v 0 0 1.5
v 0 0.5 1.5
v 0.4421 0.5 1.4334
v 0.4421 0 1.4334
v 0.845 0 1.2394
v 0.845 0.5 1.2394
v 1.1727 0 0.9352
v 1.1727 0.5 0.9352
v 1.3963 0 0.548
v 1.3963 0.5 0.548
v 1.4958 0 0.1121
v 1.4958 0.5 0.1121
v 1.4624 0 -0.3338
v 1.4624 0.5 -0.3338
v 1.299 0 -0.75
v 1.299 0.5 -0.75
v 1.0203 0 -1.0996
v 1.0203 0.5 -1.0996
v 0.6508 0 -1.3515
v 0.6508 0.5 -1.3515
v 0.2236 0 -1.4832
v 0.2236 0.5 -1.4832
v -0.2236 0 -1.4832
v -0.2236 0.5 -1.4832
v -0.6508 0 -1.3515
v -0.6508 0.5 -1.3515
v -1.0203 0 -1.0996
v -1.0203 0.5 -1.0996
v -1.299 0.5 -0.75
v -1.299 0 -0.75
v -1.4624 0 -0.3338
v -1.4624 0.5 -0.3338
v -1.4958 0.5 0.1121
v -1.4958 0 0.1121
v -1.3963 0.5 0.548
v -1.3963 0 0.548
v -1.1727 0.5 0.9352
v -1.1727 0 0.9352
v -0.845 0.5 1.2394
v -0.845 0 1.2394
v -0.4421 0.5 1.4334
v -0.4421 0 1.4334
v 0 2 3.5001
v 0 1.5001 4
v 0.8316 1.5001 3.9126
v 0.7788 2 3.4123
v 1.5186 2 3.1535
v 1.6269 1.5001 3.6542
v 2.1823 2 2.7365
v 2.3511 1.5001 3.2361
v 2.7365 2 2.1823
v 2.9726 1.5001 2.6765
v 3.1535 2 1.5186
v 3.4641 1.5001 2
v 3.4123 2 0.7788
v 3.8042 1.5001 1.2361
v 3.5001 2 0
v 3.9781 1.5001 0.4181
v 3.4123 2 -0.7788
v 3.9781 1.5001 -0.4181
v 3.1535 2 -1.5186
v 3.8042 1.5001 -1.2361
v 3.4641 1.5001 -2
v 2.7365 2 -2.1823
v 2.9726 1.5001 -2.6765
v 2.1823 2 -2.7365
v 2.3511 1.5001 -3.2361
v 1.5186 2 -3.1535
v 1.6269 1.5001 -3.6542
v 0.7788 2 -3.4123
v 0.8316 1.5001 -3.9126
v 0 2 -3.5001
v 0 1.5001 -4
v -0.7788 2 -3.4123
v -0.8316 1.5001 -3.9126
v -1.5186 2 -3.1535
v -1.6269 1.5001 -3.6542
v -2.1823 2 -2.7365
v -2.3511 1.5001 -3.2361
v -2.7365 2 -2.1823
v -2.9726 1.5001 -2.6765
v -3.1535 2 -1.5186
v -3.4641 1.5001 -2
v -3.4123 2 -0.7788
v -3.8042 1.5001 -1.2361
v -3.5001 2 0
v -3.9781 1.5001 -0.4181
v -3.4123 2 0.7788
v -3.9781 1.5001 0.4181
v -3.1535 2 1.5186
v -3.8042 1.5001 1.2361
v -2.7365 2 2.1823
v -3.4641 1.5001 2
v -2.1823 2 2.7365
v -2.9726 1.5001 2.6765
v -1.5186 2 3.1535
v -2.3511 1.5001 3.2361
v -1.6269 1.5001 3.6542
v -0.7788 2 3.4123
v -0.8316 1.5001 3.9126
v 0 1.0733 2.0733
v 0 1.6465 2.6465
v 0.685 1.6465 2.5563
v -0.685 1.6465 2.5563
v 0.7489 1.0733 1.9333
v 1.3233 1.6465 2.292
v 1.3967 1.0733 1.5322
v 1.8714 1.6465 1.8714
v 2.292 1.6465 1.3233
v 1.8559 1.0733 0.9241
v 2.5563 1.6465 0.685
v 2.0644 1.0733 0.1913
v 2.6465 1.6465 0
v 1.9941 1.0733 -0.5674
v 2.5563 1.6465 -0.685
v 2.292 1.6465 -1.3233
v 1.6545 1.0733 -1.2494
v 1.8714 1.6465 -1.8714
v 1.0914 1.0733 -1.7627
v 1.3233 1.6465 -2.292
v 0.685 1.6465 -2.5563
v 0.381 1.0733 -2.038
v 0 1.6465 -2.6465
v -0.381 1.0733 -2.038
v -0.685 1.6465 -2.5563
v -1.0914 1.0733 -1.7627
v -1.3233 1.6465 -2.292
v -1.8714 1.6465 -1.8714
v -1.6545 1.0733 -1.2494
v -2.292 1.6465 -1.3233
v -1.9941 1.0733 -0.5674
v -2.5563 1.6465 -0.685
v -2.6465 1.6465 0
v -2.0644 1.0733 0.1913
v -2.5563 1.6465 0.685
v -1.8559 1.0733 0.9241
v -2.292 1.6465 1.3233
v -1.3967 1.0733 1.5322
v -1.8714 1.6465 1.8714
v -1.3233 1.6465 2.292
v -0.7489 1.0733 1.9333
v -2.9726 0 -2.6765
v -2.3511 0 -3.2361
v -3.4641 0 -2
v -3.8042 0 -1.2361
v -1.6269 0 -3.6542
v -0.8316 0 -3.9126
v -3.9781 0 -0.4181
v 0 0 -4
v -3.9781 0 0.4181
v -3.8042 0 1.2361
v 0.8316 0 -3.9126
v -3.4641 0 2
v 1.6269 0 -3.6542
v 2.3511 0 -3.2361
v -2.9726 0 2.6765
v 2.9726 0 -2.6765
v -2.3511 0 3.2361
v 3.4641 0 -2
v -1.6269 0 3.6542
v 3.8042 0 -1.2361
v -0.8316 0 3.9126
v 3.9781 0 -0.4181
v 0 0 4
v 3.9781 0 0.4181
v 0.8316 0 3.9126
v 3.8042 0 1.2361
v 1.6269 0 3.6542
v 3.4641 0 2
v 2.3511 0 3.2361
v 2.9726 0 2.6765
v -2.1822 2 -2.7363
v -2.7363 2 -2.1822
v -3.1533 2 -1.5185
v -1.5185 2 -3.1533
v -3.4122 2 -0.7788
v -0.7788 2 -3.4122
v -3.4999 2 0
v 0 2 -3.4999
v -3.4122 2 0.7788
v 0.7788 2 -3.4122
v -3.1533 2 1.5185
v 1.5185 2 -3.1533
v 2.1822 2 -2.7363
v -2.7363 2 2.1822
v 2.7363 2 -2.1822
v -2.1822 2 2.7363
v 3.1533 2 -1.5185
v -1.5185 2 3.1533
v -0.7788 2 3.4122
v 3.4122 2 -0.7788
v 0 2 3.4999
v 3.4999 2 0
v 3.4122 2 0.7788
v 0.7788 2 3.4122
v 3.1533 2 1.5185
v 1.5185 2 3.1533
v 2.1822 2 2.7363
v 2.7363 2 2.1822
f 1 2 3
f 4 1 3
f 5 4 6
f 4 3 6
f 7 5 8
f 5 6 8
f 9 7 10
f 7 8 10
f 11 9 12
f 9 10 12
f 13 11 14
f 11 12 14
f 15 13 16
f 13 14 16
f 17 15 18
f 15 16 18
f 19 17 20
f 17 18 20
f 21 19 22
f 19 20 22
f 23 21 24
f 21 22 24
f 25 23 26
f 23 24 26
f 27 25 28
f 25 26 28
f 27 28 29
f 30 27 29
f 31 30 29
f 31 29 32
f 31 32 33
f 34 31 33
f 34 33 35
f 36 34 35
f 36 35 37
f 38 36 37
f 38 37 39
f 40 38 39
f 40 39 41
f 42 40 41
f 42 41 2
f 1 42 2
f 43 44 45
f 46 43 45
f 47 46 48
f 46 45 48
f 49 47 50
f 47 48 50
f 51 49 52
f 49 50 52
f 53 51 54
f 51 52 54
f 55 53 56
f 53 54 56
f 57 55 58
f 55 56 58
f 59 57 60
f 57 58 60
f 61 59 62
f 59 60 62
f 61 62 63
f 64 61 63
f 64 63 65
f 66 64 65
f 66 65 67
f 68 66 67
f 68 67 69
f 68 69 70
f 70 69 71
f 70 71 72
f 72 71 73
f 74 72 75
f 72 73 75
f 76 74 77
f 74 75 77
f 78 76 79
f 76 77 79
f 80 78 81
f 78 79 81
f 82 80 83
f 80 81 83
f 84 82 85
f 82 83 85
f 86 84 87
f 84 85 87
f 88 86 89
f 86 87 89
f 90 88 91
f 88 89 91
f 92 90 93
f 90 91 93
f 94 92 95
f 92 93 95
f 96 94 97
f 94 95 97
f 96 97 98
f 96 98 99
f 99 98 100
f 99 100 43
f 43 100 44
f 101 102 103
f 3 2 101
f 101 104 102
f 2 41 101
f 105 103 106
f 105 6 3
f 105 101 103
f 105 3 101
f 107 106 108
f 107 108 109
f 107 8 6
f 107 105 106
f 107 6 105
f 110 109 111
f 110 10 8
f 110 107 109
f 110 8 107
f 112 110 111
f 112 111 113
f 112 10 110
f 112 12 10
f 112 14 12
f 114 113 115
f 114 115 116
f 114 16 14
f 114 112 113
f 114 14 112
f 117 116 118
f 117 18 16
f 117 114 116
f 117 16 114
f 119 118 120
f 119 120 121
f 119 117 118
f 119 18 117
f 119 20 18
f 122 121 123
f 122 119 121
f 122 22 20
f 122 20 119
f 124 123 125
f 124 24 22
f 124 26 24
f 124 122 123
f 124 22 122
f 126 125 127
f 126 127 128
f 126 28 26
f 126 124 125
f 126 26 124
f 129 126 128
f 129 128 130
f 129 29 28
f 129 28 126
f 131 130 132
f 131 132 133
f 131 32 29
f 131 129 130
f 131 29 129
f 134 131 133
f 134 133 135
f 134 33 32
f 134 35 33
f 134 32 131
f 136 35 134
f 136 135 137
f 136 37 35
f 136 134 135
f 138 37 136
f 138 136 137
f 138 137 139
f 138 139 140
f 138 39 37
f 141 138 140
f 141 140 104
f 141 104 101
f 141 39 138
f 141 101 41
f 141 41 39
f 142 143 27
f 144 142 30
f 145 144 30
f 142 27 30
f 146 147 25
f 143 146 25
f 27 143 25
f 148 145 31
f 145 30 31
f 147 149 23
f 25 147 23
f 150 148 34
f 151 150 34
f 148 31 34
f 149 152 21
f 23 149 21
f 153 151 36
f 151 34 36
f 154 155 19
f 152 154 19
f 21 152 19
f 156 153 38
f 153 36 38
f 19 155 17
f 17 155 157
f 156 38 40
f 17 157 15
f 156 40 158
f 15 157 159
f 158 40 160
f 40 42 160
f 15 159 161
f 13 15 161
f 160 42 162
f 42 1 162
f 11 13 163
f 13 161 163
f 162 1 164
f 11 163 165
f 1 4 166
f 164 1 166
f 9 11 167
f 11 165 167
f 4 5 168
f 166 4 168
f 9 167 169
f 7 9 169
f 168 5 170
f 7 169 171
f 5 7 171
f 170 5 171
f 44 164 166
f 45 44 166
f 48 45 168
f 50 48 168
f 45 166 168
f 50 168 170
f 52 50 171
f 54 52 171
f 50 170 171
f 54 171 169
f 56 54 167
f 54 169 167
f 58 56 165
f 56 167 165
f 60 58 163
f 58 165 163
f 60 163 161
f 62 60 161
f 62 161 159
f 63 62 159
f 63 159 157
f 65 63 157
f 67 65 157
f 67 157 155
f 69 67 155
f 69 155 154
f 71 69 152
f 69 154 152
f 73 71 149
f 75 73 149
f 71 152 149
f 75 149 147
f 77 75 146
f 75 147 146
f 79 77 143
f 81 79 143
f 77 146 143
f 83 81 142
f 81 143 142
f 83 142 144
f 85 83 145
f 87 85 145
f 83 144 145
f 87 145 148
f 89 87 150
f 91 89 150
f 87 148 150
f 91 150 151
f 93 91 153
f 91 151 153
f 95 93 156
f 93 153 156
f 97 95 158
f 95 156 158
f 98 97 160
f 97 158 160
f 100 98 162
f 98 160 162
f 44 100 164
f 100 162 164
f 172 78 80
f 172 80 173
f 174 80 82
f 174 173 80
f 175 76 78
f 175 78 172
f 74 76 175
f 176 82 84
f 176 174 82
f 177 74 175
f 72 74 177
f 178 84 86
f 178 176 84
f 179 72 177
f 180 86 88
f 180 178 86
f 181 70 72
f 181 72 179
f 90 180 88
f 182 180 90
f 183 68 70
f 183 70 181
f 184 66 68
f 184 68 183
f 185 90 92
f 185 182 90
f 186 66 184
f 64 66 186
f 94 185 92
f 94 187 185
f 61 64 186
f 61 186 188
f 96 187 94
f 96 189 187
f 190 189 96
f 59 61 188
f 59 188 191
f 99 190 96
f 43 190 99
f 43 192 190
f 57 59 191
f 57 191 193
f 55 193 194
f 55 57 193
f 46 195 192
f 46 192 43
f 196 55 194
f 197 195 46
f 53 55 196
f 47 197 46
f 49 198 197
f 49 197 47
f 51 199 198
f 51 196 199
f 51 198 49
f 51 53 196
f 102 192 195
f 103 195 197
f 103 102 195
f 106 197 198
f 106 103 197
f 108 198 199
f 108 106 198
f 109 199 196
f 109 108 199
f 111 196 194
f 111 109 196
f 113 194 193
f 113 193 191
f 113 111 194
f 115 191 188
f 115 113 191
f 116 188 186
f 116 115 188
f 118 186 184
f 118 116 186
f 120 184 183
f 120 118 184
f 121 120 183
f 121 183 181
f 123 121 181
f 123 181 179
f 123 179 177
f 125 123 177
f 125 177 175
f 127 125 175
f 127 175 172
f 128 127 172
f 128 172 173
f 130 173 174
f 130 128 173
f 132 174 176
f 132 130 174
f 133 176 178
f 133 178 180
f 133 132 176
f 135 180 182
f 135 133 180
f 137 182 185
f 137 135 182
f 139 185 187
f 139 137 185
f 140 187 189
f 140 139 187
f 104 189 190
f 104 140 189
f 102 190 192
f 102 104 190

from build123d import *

# Parameters (mm, degrees)
SKETCH_1_R          = 4
EXTRUDE_1_DEPTH     = 2
SKETCH_2_R          = 1.5
CUT_EXTRUDE_1_DEPTH = 7
CHAMFER_1_SIZE      = 1.5
CHAMFER_2_SIZE      = 0.5


with BuildPart() as part:
    # 草图1 → 凸台-拉伸1 (new body)
    with BuildSketch(Plane(origin=(0, 0, 0), x_dir=(1, 0, 0), z_dir=(0, 1, 0))):
        with Locations(Location((0, 0, 0), (0, 0, 270))):
            Circle(SKETCH_1_R)
    extrude(amount=EXTRUDE_1_DEPTH)

    # 草图2 → 切除-拉伸1 (cut, through all)
    with BuildSketch(Plane(origin=(0, 2, 0), x_dir=(1, 0, 0), z_dir=(0, 1, 0))):
        with Locations(Location((0, 0, 0), (0, 0, 270))):
            Circle(SKETCH_2_R)
    extrude(amount=-CUT_EXTRUDE_1_DEPTH, mode=Mode.SUBTRACT)

    # 倒角1
    chamfer_1_edges = [part.edges().sort_by_distance(p)[0] for p in [
        (0, 2, -1.5),
    ]]
    chamfer(chamfer_1_edges, length=CHAMFER_1_SIZE)

    # 倒角2
    chamfer_2_edges = [part.edges().sort_by_distance(p)[0] for p in [
        (0, 2, -3),
        (0, 2, -4),
    ]]
    chamfer(chamfer_2_edges, length=CHAMFER_2_SIZE - 0.0001)  # a hair under: the kernel refuses the full size


solid = part.part
